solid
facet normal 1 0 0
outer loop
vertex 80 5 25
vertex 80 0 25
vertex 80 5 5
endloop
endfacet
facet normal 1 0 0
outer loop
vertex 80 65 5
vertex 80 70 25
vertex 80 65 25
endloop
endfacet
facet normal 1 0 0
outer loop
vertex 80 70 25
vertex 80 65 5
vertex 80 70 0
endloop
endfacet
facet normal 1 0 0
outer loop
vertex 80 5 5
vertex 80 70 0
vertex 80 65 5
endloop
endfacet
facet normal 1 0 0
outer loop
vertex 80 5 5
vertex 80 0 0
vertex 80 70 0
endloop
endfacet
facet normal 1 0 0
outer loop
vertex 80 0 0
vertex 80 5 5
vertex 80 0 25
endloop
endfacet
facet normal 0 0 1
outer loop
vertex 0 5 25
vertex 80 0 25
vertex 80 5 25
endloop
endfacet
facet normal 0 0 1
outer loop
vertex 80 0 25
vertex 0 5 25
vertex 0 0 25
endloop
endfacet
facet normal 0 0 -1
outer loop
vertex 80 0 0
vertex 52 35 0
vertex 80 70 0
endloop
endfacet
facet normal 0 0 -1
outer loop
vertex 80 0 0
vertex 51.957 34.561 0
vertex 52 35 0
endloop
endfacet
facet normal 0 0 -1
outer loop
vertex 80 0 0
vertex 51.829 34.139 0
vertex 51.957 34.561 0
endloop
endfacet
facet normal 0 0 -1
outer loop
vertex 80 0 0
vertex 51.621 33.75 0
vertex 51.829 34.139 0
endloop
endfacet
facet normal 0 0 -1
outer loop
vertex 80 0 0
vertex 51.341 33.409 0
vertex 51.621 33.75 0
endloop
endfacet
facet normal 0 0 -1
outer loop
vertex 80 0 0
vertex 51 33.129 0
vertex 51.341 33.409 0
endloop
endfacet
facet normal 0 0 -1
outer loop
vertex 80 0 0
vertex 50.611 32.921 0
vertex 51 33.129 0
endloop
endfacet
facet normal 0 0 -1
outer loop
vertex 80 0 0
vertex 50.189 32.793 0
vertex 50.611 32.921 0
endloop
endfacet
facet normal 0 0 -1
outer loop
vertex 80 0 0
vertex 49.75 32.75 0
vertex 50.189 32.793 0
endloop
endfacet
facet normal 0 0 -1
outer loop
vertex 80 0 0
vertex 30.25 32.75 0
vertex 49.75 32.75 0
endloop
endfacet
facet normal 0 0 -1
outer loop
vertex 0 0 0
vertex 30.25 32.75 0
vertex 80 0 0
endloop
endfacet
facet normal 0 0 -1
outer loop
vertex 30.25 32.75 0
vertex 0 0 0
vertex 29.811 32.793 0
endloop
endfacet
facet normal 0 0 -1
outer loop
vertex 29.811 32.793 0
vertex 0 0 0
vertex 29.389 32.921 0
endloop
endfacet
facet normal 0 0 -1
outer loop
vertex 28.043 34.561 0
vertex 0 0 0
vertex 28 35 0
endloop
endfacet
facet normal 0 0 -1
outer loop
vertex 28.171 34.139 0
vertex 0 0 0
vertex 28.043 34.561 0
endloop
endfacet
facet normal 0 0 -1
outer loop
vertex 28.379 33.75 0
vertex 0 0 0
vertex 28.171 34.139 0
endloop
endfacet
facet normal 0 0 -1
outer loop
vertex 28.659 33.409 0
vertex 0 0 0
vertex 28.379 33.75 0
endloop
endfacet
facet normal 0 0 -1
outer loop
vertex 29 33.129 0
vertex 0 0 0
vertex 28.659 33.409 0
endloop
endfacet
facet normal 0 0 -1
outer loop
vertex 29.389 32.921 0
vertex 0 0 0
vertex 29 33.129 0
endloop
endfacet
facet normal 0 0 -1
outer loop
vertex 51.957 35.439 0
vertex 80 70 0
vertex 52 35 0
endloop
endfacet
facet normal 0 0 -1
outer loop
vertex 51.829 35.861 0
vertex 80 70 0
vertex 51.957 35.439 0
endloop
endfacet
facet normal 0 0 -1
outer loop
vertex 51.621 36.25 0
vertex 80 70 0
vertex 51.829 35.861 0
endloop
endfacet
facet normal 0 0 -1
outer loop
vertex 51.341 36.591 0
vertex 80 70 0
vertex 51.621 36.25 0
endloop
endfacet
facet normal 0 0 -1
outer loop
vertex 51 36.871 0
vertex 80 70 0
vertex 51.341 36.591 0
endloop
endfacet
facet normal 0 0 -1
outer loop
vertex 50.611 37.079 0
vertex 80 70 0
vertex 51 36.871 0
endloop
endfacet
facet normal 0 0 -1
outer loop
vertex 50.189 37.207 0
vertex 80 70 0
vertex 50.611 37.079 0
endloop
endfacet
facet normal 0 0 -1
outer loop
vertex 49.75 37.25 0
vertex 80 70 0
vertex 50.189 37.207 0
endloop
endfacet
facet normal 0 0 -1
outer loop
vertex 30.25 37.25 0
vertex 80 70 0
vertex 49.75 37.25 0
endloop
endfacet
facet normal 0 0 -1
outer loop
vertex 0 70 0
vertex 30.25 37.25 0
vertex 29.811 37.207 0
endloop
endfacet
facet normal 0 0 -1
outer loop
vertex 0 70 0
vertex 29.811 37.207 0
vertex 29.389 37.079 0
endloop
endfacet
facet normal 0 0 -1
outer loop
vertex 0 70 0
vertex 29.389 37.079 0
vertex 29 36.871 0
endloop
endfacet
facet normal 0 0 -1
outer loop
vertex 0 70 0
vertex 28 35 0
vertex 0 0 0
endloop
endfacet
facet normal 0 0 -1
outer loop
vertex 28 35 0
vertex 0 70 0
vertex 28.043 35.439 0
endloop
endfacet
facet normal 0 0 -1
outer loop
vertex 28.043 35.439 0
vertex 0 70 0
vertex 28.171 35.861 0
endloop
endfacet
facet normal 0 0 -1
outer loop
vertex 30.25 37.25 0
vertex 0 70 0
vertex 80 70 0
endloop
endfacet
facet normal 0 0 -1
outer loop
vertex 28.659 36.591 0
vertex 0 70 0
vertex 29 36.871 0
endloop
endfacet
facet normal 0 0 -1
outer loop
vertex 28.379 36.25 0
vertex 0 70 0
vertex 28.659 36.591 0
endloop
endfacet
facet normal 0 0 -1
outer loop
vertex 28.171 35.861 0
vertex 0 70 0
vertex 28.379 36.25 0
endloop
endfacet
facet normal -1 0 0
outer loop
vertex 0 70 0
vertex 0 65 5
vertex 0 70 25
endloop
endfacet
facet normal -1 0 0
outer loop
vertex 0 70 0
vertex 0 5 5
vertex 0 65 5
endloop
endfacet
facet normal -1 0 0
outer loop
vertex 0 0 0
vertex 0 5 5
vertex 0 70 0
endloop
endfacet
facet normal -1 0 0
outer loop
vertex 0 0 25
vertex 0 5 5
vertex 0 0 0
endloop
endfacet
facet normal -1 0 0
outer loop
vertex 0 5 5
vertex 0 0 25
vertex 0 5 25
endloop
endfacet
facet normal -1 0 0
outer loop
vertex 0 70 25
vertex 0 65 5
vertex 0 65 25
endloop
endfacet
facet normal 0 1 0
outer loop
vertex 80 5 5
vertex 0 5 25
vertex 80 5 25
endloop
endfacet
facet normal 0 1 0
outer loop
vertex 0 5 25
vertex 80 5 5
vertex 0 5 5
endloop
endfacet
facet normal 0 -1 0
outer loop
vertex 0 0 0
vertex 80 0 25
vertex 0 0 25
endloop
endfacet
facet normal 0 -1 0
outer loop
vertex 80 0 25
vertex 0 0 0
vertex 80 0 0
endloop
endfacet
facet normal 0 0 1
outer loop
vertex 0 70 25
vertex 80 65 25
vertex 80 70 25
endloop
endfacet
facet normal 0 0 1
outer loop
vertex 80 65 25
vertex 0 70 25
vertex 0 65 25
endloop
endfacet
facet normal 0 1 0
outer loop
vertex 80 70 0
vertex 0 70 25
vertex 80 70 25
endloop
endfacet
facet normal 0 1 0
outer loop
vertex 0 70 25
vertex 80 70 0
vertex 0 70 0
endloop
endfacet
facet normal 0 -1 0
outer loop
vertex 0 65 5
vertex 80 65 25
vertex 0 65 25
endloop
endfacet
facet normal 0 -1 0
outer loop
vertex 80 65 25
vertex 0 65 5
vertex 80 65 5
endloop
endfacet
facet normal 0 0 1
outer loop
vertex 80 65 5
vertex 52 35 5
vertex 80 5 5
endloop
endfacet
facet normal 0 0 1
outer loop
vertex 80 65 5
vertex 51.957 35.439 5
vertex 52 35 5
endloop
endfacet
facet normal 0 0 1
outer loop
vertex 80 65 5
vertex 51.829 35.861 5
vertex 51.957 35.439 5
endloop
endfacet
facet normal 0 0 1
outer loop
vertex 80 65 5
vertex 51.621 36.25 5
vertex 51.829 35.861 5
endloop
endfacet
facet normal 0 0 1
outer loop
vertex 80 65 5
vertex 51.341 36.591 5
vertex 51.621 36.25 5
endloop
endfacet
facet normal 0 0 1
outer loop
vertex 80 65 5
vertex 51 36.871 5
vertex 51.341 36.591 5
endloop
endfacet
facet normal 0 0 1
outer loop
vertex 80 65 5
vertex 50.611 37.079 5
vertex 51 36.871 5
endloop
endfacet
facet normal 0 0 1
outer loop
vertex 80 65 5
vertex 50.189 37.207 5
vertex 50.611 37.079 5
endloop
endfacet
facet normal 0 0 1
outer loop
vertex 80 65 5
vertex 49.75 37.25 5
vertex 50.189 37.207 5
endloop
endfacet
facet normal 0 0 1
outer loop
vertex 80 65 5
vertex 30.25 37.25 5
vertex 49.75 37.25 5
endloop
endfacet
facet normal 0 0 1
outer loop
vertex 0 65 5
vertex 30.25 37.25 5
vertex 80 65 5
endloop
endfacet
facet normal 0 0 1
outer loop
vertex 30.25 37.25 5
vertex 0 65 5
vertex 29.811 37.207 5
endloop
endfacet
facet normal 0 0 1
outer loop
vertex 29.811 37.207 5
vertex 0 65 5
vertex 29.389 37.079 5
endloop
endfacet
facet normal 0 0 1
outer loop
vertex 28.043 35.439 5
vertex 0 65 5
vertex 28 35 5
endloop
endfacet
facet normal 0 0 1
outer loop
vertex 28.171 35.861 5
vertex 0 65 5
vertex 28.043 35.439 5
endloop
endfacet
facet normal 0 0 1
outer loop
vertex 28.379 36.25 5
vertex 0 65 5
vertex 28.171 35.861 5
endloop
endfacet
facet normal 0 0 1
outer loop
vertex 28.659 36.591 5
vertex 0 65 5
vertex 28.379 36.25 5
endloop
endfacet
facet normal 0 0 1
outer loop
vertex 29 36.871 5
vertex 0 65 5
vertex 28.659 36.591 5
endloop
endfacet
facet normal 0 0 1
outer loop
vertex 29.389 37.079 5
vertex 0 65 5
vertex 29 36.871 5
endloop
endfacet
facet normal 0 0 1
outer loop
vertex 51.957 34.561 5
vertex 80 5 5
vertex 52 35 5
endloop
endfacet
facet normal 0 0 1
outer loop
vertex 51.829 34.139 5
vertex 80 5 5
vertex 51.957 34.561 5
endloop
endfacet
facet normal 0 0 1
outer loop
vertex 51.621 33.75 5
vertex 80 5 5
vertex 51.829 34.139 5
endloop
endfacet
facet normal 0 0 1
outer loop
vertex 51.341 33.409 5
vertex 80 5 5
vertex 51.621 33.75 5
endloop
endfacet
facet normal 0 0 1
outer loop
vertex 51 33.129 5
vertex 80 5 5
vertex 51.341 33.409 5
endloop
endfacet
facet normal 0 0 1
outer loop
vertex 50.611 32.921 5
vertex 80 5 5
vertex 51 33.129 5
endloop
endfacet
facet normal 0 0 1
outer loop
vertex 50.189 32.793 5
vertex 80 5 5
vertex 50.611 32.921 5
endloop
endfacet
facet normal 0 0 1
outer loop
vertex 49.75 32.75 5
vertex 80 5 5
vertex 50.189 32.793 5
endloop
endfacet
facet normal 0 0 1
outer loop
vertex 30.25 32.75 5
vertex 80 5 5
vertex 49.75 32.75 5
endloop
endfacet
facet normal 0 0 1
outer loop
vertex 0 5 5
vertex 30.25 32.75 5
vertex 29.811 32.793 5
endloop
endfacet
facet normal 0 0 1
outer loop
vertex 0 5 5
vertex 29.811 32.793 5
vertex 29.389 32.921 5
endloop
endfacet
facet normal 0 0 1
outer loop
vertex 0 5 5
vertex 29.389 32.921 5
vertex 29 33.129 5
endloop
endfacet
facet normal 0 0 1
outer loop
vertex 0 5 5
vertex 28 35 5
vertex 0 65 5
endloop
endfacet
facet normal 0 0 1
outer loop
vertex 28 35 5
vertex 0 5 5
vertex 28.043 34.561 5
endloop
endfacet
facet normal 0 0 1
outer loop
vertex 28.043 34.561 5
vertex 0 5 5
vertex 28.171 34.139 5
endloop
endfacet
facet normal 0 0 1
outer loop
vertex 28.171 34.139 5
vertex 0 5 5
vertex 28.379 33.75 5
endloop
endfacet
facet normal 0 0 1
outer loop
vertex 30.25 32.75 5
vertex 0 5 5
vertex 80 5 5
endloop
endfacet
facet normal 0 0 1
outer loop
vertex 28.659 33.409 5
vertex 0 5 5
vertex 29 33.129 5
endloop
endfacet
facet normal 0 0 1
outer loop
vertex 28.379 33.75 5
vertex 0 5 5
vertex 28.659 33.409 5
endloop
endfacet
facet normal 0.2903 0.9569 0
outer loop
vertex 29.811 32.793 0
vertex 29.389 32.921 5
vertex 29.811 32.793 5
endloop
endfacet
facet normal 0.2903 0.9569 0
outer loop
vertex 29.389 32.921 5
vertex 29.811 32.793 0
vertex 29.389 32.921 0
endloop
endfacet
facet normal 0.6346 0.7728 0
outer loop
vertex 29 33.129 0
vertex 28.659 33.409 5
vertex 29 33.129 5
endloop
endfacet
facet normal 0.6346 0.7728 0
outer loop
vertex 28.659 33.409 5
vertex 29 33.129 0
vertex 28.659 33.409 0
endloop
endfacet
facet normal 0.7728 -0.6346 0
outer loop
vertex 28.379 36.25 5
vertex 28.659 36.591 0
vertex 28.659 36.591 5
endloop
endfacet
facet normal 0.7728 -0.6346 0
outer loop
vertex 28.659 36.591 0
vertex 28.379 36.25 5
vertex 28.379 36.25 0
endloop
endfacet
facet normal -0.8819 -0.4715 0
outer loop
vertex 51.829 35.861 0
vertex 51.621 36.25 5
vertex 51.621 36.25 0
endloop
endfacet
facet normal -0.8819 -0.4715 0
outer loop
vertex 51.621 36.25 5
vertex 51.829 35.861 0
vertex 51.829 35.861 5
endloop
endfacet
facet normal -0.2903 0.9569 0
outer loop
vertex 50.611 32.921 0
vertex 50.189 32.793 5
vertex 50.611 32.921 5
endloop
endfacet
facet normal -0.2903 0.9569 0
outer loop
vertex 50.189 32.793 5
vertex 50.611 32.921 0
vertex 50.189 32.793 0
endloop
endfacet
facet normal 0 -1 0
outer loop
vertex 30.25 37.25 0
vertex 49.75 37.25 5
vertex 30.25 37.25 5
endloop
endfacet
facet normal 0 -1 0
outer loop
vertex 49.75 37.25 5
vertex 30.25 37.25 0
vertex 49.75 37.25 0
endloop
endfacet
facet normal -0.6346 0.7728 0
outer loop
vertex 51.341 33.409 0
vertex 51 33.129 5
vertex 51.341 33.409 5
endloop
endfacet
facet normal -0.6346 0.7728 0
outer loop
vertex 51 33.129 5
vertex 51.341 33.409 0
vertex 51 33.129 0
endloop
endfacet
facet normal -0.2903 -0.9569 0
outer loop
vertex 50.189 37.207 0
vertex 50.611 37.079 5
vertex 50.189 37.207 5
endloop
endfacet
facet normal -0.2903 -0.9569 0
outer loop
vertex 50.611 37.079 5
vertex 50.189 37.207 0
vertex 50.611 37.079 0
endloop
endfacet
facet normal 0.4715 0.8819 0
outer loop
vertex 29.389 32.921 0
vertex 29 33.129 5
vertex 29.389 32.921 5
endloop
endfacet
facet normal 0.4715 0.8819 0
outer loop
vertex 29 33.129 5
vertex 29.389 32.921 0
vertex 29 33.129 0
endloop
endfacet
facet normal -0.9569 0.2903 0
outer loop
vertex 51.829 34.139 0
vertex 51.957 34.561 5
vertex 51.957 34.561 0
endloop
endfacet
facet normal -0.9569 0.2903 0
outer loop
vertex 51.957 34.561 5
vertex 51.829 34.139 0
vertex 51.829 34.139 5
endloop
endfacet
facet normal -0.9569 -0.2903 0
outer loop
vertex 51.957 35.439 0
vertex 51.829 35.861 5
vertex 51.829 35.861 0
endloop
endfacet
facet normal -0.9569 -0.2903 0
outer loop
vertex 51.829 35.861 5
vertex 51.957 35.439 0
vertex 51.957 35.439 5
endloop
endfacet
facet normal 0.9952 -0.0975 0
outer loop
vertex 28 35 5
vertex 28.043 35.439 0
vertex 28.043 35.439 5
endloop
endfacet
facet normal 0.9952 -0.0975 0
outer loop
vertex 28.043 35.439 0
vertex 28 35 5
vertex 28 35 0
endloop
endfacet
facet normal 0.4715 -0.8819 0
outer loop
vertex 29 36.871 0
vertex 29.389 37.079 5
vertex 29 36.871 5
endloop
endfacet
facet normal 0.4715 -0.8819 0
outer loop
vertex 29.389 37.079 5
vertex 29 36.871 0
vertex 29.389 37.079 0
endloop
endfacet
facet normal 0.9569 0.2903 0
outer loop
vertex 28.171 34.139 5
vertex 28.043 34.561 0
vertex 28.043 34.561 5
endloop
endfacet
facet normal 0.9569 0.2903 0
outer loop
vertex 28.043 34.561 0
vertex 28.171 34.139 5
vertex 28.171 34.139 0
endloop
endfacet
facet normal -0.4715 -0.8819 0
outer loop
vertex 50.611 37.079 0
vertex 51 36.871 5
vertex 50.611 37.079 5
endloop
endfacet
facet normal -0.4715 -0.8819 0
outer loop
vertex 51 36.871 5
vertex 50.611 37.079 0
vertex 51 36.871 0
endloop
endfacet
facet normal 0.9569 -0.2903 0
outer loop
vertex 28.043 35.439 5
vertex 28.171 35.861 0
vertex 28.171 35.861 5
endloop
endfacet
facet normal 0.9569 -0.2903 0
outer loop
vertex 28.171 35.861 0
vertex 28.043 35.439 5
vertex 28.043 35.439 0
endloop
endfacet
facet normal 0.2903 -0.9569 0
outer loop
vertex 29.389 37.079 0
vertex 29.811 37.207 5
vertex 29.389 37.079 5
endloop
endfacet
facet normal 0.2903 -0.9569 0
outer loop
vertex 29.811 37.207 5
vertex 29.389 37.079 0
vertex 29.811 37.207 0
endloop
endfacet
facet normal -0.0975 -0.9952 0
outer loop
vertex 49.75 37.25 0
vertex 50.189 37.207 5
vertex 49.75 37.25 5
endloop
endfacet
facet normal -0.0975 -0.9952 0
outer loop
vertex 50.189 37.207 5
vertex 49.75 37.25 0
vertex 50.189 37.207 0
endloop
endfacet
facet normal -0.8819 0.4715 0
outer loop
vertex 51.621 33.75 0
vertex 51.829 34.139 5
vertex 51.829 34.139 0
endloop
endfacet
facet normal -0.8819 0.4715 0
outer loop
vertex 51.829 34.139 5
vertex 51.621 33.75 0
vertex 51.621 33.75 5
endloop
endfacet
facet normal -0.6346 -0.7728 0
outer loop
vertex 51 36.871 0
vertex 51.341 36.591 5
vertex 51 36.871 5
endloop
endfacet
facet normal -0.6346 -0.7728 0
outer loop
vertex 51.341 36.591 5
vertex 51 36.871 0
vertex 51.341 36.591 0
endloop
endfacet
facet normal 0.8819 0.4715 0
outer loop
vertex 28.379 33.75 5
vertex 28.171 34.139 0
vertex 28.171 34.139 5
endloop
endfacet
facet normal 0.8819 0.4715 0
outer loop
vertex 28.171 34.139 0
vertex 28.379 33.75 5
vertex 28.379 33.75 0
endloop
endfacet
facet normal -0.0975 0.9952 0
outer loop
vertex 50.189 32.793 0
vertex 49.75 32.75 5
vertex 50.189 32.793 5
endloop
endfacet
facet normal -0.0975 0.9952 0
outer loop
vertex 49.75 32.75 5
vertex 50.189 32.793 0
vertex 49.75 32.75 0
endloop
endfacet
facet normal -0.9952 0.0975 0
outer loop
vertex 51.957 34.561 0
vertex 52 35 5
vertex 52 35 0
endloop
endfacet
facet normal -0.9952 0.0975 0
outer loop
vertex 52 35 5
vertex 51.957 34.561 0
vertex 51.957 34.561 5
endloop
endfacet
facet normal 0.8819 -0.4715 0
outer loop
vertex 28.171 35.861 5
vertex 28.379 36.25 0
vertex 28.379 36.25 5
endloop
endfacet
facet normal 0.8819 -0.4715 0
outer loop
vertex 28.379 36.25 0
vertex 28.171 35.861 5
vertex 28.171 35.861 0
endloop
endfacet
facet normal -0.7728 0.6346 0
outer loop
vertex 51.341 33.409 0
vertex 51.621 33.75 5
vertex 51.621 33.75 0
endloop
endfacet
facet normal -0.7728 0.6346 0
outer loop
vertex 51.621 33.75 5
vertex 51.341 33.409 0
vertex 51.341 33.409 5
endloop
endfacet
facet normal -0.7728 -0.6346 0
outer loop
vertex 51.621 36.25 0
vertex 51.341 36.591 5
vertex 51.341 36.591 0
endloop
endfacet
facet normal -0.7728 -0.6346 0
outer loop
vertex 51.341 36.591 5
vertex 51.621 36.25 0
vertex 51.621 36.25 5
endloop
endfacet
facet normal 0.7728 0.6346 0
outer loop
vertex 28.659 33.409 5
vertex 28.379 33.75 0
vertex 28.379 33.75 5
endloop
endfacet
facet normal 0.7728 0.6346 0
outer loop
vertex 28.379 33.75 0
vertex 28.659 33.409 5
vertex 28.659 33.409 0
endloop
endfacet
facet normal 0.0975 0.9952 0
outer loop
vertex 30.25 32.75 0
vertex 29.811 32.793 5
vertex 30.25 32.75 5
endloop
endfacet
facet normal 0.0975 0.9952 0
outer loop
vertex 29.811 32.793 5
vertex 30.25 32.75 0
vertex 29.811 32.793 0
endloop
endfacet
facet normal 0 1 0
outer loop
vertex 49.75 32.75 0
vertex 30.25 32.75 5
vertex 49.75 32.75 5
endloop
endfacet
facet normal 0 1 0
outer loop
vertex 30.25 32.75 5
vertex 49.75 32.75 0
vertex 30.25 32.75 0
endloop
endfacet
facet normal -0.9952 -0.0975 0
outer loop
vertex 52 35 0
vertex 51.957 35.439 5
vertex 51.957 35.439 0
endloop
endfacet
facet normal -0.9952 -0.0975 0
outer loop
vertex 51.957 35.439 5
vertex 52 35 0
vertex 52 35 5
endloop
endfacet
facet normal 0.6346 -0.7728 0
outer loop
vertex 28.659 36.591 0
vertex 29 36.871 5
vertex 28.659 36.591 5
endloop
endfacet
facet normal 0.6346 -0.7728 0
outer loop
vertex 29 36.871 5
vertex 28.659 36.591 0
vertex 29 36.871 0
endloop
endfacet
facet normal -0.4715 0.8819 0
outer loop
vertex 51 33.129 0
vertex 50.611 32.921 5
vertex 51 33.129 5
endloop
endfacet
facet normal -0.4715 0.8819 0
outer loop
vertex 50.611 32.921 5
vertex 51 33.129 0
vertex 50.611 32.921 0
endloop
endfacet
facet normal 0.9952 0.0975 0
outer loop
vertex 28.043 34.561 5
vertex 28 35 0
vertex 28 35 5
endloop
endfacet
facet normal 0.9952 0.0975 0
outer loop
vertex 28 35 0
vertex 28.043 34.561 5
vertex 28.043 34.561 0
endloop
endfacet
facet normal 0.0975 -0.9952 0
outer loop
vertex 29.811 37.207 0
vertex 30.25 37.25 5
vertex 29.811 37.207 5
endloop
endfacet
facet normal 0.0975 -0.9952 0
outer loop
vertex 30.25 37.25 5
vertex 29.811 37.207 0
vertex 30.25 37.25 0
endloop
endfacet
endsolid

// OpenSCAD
$fn = 32;

// ----------------------------------------------------------------------
// U-bracket: 80 x 70 x 25 mm
// ----------------------------------------------------------------------

// --- parameters (mm) ---
length = 80;              // outer length, X
width = 70;               // outer width, Y
height = 25;              // upright height, Z
thick = 5;                // wall thickness
hole_d = 4.5;             // clearance for M4
slot_l = 24;              // slot length

module hole_z(px, py) {
  translate([px, py, -0.5]) cylinder(h = thick + 1, d = hole_d);
}
module hole_y_pz(pz) {
  /* through both uprights along Y */
  translate([0, -0.5, pz]) rotate([-90, 0, 0]) cylinder(h = width + 1, d = hole_d);
}
module slot_z(px, py) {
  hull() {
    translate([px - (slot_l - hole_d) / 2, py, -0.5]) cylinder(h = thick + 1, d = hole_d);
    translate([px + (slot_l - hole_d) / 2, py, -0.5]) cylinder(h = thick + 1, d = hole_d);
  }
}

module base() {
  cube([length, width, thick]);
}

module uprights() {
  cube([length, thick, height]);
  translate([0, width - thick, 0]) cube([length, thick, height]);
}

difference() {
  union() {
    base();
    uprights();
  }
  slot_z(40, 35);
}
